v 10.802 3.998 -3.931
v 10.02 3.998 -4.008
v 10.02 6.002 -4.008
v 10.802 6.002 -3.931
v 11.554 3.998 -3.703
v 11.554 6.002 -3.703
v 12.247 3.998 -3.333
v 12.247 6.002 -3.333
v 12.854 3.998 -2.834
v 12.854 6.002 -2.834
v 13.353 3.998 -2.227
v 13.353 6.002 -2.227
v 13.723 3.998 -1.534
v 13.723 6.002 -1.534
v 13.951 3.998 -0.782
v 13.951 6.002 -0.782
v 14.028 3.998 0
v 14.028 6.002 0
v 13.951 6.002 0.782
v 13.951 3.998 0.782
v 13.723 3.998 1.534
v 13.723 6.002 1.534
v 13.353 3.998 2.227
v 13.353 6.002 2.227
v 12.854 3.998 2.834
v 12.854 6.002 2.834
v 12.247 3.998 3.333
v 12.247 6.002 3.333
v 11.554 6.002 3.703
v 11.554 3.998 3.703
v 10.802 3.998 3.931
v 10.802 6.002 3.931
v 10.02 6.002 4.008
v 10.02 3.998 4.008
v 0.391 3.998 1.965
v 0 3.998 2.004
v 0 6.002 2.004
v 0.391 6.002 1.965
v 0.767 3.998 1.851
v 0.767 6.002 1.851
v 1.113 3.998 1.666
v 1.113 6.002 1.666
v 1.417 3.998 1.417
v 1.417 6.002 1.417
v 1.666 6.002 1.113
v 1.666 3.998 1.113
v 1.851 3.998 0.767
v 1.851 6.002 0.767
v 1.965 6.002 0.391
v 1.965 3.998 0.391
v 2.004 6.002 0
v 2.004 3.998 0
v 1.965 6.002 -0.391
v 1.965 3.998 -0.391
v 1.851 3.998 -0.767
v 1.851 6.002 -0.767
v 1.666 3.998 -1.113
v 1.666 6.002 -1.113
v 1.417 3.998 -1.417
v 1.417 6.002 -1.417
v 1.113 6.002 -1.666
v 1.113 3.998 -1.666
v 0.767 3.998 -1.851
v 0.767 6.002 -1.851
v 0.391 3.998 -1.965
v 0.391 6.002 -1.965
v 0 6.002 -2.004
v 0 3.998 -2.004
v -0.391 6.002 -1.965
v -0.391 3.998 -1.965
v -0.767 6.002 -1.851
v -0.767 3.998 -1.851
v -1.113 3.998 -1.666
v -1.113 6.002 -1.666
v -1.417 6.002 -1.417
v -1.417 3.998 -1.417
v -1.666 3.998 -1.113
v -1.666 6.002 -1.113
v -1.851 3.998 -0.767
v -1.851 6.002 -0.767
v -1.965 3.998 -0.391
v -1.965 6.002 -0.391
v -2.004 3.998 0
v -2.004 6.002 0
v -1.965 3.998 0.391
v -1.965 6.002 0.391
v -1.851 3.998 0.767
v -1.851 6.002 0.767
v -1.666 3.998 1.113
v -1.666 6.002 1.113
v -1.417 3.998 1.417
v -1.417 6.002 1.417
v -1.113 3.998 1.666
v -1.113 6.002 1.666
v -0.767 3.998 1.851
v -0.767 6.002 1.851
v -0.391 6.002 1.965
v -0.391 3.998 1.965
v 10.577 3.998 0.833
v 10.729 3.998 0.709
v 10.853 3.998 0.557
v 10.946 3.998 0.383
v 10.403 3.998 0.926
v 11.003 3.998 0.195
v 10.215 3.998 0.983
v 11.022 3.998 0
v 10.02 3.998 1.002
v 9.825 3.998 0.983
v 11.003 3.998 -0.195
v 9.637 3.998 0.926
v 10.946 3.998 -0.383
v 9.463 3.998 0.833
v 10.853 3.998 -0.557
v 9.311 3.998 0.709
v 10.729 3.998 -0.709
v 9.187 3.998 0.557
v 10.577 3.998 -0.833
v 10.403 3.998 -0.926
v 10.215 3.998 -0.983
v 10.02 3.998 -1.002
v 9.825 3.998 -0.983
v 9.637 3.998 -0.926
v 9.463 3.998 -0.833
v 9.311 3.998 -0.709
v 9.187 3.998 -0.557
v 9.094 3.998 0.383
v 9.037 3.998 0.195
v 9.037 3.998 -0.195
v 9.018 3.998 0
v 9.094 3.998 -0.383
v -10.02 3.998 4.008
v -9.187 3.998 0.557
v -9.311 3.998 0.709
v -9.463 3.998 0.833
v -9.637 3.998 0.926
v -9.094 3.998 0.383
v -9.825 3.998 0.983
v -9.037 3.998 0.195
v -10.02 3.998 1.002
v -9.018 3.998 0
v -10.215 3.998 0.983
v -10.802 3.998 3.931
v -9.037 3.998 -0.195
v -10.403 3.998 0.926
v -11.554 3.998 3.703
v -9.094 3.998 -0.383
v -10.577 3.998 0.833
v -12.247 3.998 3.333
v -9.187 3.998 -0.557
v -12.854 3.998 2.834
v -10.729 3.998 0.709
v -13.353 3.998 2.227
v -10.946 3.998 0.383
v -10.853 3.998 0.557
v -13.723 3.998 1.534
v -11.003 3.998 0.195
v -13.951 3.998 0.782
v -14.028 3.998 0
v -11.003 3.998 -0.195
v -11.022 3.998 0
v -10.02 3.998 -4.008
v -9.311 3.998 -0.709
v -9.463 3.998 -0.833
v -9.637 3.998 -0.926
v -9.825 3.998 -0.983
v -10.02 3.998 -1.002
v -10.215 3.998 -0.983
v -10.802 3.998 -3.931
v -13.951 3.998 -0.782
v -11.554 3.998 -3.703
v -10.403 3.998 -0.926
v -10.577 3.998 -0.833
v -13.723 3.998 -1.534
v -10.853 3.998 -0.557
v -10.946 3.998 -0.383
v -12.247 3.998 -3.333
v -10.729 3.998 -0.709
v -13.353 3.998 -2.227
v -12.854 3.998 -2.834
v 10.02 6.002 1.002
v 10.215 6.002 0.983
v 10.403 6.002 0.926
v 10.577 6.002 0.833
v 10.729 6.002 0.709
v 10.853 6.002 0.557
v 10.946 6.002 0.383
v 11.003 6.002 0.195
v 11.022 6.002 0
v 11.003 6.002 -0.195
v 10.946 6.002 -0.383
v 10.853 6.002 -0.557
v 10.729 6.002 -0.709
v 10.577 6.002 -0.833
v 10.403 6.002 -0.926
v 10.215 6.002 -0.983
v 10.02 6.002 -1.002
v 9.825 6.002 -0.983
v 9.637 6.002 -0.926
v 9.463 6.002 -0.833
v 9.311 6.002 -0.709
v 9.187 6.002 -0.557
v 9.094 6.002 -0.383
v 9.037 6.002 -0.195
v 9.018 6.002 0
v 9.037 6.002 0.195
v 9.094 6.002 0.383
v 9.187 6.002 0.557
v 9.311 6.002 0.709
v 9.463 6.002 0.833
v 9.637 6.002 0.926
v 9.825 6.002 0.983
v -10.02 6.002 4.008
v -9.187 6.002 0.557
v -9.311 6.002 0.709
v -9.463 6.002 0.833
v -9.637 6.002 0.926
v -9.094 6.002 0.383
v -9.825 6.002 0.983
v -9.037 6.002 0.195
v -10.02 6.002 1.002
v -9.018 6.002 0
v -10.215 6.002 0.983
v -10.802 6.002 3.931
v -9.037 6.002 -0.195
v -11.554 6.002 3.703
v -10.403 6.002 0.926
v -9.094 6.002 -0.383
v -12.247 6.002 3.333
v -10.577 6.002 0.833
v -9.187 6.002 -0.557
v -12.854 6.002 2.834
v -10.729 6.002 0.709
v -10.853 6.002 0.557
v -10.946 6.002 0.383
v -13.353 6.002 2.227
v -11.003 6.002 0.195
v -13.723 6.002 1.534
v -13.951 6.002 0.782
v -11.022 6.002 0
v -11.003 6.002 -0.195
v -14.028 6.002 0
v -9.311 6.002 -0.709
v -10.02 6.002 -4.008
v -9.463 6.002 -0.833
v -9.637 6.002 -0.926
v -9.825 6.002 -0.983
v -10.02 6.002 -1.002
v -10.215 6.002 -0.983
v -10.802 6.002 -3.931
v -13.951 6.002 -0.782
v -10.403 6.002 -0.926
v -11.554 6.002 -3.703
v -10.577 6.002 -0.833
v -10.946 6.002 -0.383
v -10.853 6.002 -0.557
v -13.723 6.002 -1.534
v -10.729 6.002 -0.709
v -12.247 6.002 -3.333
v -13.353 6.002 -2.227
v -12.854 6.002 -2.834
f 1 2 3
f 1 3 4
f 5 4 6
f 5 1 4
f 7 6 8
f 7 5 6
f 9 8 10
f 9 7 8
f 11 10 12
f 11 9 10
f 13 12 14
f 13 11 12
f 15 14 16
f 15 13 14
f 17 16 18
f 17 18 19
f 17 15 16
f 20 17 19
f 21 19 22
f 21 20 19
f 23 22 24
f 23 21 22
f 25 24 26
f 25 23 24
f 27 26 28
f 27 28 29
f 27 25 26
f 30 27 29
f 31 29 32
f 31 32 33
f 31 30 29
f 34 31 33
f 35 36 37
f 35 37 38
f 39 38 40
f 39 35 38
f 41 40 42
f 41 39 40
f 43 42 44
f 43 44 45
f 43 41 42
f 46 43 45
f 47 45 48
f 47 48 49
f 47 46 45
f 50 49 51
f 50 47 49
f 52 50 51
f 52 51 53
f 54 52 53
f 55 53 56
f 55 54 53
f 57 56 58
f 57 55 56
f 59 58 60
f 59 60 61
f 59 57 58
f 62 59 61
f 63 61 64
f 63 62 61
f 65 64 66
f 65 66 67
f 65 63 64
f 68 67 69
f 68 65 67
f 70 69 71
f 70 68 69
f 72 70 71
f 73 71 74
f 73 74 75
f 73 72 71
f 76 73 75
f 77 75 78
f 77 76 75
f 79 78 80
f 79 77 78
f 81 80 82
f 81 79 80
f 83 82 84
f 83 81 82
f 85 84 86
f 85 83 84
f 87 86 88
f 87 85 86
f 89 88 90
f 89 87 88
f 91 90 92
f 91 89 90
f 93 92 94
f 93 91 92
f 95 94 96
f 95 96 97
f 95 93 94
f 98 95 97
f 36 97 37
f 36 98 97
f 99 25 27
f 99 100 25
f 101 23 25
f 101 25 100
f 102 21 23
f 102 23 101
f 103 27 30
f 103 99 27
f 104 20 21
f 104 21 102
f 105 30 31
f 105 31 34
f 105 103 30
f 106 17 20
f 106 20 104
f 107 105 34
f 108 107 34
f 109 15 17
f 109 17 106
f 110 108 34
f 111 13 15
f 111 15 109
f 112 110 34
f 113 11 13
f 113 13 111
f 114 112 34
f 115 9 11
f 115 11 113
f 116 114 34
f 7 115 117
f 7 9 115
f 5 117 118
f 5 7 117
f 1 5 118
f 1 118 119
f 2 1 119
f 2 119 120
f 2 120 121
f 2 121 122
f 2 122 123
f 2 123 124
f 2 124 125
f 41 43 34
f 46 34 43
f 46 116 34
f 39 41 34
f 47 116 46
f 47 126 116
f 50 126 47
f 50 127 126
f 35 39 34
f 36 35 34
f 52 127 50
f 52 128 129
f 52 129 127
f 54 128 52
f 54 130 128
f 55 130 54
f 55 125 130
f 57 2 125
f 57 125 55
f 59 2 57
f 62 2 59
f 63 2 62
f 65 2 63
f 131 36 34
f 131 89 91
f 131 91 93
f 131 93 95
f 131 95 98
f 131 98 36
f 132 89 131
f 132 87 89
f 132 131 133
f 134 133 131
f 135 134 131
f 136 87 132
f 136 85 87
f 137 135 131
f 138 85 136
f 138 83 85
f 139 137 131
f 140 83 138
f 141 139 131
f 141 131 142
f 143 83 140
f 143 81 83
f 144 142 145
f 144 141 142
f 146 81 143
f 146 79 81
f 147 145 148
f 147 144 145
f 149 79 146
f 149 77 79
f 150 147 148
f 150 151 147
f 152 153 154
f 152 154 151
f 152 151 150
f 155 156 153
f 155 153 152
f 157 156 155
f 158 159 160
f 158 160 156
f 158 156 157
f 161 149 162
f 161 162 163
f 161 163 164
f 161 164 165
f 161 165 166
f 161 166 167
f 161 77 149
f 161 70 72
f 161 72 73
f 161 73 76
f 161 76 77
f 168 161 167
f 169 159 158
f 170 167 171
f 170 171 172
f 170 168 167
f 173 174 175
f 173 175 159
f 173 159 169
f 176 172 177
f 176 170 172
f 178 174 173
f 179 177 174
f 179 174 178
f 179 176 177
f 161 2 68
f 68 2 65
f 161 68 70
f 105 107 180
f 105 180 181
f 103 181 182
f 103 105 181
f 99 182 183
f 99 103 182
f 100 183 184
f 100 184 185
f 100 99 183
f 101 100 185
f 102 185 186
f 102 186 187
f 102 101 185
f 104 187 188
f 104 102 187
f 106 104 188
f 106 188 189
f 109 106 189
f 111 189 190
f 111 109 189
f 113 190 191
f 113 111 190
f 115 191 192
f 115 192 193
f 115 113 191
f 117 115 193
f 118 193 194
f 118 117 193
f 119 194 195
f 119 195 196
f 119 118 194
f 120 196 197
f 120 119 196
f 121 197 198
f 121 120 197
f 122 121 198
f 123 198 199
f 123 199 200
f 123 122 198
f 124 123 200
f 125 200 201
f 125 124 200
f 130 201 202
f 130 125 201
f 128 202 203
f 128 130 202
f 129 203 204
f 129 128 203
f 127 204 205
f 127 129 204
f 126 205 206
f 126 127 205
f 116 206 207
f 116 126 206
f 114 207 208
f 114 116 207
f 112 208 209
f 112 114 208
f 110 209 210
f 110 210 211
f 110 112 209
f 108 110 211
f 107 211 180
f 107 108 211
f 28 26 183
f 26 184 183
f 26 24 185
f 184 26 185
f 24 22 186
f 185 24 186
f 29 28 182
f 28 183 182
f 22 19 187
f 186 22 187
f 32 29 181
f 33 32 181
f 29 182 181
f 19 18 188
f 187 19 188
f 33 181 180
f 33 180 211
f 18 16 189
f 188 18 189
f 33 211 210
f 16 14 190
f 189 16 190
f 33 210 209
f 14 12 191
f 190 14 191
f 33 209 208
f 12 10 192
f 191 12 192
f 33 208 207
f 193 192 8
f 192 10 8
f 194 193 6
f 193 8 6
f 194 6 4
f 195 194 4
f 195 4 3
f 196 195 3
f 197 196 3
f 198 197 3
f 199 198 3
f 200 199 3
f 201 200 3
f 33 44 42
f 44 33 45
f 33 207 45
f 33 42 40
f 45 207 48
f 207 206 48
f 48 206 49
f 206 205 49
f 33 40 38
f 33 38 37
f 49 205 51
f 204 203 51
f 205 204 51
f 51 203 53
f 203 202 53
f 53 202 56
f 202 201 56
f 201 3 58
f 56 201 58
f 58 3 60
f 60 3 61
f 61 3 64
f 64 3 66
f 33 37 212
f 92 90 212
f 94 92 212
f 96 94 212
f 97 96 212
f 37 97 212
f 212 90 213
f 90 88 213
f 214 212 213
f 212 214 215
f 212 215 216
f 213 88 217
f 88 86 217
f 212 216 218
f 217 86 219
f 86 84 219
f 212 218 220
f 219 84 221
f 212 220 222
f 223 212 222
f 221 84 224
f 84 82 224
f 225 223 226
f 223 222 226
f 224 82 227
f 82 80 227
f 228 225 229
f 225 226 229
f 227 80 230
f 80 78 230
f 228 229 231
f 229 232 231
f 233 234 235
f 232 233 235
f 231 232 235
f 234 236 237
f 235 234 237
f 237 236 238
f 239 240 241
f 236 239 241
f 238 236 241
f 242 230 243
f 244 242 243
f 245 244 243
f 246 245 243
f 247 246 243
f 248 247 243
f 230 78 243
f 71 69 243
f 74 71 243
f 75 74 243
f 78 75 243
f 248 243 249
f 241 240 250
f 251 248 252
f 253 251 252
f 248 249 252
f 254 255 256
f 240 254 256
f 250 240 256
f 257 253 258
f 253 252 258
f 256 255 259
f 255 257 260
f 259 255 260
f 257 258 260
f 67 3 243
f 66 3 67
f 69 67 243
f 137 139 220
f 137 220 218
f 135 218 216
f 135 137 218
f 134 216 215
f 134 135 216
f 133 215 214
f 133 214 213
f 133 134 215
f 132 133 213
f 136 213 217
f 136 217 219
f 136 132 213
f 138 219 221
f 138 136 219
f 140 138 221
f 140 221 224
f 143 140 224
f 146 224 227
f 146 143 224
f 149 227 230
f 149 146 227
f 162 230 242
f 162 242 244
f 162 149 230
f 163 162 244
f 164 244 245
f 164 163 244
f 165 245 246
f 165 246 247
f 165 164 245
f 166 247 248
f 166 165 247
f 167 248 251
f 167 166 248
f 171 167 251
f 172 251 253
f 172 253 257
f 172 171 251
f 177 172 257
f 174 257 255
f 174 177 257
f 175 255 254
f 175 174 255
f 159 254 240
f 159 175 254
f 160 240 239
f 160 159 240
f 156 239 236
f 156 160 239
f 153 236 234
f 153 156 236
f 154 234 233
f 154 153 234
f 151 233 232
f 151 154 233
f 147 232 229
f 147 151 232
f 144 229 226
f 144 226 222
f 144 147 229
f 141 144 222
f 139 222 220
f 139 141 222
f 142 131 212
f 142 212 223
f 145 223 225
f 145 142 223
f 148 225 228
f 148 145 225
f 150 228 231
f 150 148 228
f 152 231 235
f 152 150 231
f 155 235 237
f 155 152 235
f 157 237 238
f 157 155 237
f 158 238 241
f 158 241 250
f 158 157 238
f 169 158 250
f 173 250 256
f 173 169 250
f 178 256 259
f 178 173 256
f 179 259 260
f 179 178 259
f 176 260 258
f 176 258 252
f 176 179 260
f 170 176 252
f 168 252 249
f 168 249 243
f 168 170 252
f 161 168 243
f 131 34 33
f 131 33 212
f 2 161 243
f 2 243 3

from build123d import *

# Parameters (mm, degrees)
SKETCH2_R           = 5
SKETCH2_R_2         = 10
BOSS_EXTRUDE1_DEPTH = 10
SCALE2_SCALE        = 0.2004


with BuildPart() as part:
    # Sketch2 → Boss-Extrude1 (new body)
    with BuildSketch(Plane(origin=(0, 0, 0), x_dir=(1, 0, 0), z_dir=(0, 1, 0))):
        with BuildLine():
            Line((-50, 20), (50, 20))
            ThreePointArc((50, 20), (70, 0), (50, -20))
            Line((50, -20), (-50, -20))
            ThreePointArc((-50, -20), (-70, 0), (-50, 20))
        make_face()
        with Locations(Location((50, 0, 0), (0, 0, 270))):
            Circle(SKETCH2_R, mode=Mode.SUBTRACT)
        with Locations(Location((-50, 0, 0), (0, 0, 270))):
            Circle(SKETCH2_R, mode=Mode.SUBTRACT)
        with Locations(Location((0, 0, 0), (0, 0, 270))):
            Circle(SKETCH2_R_2, mode=Mode.SUBTRACT)
    extrude(amount=BOSS_EXTRUDE1_DEPTH)


with BuildPart() as part_1:
    # Scale2: scaled about (0, 5, 0)
    add(part.part.scale(SCALE2_SCALE).moved(Location((0, 3.998, 0))))


solid = part_1.part
